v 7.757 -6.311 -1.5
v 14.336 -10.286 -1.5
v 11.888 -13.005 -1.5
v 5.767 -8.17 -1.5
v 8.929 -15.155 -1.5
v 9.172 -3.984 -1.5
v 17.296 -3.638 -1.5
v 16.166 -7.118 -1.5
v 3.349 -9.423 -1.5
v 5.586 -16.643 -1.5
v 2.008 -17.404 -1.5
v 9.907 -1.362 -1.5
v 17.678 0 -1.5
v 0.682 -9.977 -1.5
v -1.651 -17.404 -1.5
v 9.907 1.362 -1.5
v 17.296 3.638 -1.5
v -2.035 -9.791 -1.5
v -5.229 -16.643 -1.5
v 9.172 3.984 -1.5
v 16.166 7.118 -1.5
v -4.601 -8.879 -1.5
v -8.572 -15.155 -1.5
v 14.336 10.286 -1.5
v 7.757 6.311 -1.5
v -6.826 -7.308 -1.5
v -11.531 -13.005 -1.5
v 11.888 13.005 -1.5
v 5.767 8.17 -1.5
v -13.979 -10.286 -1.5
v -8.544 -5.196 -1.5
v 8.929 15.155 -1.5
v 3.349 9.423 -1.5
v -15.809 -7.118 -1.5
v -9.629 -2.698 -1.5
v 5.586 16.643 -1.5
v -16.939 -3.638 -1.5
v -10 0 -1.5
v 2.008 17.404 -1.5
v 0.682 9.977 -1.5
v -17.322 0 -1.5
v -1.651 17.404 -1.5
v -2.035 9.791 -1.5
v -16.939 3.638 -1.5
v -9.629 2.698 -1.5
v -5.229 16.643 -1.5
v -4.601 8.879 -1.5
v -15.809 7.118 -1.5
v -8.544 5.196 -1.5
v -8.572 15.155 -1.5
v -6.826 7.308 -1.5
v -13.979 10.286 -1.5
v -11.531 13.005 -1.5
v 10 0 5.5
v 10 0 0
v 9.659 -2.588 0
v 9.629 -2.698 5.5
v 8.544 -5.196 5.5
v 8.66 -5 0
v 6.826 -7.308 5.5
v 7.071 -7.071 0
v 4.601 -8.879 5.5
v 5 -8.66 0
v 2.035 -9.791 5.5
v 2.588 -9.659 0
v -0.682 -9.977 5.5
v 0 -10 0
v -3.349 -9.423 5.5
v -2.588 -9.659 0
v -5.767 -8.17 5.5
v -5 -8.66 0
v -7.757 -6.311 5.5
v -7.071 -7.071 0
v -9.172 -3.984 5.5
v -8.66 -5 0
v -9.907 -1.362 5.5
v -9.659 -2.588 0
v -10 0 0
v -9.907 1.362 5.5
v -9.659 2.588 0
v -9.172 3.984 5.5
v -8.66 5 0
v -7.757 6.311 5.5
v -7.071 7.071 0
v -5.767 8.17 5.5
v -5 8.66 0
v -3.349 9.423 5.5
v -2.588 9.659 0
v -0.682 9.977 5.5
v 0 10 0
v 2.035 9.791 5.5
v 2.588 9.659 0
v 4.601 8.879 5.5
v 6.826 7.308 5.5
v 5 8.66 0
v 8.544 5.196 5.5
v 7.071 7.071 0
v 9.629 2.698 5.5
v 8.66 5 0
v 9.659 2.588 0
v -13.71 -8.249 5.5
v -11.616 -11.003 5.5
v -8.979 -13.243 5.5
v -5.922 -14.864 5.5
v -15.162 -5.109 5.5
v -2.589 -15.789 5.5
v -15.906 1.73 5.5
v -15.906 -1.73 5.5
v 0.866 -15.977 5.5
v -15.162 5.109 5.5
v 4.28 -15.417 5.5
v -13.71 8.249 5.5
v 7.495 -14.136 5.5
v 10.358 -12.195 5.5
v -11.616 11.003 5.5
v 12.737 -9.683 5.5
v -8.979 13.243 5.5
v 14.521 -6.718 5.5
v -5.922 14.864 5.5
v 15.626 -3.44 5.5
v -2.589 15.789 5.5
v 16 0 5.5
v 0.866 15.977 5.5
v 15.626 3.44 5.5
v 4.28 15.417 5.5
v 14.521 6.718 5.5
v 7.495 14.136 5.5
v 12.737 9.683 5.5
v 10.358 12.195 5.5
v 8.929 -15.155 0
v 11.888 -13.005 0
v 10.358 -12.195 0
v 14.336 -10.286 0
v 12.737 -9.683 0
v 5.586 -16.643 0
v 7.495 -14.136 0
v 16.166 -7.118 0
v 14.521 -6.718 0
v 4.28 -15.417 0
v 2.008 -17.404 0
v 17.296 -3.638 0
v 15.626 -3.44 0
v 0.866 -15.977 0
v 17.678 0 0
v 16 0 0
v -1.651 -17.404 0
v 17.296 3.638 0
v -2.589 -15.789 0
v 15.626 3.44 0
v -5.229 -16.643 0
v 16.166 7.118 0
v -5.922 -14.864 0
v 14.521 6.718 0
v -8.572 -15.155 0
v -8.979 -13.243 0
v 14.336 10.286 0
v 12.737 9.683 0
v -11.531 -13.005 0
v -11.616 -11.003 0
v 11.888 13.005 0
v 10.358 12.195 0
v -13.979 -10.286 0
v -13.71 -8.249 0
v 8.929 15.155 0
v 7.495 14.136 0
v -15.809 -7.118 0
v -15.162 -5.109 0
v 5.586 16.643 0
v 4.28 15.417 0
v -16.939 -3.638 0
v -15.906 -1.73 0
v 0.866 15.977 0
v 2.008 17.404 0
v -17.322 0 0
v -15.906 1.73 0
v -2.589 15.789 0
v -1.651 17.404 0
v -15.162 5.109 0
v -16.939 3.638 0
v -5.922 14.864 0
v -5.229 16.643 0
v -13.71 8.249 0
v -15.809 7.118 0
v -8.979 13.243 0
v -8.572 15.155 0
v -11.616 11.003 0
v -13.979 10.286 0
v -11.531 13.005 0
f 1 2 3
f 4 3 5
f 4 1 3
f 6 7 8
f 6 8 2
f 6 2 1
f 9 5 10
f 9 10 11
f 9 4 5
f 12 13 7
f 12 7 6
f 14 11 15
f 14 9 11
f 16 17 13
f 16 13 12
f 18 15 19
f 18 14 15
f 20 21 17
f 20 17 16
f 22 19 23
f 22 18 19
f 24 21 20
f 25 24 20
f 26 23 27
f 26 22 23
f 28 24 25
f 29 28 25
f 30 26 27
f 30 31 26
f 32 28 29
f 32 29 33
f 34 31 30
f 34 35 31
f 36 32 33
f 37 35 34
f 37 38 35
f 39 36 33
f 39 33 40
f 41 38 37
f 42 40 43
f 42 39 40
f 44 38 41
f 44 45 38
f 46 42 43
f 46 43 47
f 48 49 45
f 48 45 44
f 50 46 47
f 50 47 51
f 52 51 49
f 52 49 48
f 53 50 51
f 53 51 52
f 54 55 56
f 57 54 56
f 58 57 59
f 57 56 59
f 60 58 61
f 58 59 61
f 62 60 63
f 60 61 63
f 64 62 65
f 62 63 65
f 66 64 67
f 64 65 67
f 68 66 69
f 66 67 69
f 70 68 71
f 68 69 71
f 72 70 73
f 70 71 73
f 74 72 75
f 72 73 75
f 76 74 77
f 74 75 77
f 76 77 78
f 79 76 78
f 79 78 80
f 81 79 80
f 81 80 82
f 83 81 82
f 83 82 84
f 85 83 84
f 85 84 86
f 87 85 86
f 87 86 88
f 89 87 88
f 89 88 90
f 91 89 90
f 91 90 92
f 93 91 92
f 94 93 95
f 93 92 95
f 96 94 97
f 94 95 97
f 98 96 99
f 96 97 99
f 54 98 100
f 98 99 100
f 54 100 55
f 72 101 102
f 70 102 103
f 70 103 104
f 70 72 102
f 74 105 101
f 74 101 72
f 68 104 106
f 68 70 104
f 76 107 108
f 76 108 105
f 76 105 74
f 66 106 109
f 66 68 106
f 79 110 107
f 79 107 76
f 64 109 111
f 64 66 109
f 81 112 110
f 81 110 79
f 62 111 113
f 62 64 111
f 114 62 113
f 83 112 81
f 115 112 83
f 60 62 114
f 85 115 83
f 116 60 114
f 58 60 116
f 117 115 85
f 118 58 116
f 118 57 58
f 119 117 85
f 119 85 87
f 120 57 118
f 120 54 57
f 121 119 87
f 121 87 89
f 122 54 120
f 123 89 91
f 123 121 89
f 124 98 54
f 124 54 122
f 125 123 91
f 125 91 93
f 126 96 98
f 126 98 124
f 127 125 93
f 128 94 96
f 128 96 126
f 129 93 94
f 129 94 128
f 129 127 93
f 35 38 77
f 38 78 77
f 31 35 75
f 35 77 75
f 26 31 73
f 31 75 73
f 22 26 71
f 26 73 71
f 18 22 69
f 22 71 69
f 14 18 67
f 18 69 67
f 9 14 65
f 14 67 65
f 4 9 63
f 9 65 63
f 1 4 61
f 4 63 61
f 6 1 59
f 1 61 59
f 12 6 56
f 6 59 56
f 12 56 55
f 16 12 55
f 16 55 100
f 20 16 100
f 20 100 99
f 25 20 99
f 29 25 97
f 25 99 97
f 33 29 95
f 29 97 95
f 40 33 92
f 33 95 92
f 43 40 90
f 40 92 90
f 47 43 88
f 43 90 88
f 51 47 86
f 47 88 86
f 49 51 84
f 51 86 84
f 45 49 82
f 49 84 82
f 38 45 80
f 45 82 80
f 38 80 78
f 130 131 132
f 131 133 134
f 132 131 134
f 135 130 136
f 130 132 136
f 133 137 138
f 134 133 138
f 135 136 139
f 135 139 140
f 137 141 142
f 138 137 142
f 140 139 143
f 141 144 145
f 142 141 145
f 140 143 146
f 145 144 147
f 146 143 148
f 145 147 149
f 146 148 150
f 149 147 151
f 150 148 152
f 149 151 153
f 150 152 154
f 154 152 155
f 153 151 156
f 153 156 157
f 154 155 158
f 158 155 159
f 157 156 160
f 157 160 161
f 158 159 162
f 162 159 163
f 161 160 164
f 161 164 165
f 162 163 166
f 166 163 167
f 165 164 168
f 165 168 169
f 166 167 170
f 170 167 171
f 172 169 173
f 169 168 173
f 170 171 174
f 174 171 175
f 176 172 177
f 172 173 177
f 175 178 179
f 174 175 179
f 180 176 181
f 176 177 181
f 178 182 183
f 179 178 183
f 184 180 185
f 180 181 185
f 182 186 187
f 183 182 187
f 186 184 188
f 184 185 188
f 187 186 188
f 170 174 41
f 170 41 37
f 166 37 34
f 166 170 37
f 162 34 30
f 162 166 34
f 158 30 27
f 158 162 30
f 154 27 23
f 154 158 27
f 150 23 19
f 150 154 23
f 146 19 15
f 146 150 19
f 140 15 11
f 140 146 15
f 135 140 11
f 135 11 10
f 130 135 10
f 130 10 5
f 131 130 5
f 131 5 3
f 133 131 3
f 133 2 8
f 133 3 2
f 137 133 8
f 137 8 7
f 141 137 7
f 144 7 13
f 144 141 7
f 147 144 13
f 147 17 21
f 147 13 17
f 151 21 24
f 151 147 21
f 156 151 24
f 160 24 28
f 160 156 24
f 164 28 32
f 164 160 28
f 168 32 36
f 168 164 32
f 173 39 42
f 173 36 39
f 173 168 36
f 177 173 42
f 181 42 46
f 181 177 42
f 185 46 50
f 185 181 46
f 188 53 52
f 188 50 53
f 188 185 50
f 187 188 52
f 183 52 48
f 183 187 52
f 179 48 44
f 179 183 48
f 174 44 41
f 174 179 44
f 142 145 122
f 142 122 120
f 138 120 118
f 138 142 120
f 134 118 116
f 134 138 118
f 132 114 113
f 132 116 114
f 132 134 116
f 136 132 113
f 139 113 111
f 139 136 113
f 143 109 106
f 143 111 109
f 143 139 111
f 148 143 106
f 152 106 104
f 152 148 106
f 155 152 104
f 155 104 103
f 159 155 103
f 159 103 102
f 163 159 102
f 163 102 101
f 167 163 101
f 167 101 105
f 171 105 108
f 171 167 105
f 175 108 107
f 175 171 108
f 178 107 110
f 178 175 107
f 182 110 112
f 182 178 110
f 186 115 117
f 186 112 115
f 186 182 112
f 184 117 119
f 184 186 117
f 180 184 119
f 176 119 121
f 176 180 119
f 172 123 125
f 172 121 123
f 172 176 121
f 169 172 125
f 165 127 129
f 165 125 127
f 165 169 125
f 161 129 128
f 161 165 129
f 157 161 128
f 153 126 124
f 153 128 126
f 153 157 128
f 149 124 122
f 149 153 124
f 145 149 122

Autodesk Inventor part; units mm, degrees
ref_plane "YZ Plane" through (0, 0, 0) normal (1, 0, 0) x (0, 1, 0)
ref_plane "XZ Plane" through (0, 0, 0) normal (0, 1, 0) x (-1, 0, 0)
ref_plane "XY Plane" through (0, 0, 0) normal (0, 0, 1) x (1, 0, 0)
sketch "Sketch1" plane through (0, 0, 0) normal (0, 0, 1) x (1, 0, 0)
  circle A0 centre (0, 0) radius 10
  circle A1 centre (0, 0) radius 16
  dimension "d0" = 20
  dimension "d1" = 32
extrude "Extrusion1" add sketch "Sketch1" along normal blind 5.5
sketch "Sketch2" plane through (0, 0, 0) normal (0, 0, -1) x (-1, 0, 0)
  circle A0 centre (0, 0) radius 10
  circle A1 centre (-0.1785, 0) radius 17.5
  dimension "d4" = 20
  dimension "d5" = 35
extrude "Extrusion2" add sketch "Sketch2" along normal blind 1.5
properties part number "F6004" material "Stainless Steel"
